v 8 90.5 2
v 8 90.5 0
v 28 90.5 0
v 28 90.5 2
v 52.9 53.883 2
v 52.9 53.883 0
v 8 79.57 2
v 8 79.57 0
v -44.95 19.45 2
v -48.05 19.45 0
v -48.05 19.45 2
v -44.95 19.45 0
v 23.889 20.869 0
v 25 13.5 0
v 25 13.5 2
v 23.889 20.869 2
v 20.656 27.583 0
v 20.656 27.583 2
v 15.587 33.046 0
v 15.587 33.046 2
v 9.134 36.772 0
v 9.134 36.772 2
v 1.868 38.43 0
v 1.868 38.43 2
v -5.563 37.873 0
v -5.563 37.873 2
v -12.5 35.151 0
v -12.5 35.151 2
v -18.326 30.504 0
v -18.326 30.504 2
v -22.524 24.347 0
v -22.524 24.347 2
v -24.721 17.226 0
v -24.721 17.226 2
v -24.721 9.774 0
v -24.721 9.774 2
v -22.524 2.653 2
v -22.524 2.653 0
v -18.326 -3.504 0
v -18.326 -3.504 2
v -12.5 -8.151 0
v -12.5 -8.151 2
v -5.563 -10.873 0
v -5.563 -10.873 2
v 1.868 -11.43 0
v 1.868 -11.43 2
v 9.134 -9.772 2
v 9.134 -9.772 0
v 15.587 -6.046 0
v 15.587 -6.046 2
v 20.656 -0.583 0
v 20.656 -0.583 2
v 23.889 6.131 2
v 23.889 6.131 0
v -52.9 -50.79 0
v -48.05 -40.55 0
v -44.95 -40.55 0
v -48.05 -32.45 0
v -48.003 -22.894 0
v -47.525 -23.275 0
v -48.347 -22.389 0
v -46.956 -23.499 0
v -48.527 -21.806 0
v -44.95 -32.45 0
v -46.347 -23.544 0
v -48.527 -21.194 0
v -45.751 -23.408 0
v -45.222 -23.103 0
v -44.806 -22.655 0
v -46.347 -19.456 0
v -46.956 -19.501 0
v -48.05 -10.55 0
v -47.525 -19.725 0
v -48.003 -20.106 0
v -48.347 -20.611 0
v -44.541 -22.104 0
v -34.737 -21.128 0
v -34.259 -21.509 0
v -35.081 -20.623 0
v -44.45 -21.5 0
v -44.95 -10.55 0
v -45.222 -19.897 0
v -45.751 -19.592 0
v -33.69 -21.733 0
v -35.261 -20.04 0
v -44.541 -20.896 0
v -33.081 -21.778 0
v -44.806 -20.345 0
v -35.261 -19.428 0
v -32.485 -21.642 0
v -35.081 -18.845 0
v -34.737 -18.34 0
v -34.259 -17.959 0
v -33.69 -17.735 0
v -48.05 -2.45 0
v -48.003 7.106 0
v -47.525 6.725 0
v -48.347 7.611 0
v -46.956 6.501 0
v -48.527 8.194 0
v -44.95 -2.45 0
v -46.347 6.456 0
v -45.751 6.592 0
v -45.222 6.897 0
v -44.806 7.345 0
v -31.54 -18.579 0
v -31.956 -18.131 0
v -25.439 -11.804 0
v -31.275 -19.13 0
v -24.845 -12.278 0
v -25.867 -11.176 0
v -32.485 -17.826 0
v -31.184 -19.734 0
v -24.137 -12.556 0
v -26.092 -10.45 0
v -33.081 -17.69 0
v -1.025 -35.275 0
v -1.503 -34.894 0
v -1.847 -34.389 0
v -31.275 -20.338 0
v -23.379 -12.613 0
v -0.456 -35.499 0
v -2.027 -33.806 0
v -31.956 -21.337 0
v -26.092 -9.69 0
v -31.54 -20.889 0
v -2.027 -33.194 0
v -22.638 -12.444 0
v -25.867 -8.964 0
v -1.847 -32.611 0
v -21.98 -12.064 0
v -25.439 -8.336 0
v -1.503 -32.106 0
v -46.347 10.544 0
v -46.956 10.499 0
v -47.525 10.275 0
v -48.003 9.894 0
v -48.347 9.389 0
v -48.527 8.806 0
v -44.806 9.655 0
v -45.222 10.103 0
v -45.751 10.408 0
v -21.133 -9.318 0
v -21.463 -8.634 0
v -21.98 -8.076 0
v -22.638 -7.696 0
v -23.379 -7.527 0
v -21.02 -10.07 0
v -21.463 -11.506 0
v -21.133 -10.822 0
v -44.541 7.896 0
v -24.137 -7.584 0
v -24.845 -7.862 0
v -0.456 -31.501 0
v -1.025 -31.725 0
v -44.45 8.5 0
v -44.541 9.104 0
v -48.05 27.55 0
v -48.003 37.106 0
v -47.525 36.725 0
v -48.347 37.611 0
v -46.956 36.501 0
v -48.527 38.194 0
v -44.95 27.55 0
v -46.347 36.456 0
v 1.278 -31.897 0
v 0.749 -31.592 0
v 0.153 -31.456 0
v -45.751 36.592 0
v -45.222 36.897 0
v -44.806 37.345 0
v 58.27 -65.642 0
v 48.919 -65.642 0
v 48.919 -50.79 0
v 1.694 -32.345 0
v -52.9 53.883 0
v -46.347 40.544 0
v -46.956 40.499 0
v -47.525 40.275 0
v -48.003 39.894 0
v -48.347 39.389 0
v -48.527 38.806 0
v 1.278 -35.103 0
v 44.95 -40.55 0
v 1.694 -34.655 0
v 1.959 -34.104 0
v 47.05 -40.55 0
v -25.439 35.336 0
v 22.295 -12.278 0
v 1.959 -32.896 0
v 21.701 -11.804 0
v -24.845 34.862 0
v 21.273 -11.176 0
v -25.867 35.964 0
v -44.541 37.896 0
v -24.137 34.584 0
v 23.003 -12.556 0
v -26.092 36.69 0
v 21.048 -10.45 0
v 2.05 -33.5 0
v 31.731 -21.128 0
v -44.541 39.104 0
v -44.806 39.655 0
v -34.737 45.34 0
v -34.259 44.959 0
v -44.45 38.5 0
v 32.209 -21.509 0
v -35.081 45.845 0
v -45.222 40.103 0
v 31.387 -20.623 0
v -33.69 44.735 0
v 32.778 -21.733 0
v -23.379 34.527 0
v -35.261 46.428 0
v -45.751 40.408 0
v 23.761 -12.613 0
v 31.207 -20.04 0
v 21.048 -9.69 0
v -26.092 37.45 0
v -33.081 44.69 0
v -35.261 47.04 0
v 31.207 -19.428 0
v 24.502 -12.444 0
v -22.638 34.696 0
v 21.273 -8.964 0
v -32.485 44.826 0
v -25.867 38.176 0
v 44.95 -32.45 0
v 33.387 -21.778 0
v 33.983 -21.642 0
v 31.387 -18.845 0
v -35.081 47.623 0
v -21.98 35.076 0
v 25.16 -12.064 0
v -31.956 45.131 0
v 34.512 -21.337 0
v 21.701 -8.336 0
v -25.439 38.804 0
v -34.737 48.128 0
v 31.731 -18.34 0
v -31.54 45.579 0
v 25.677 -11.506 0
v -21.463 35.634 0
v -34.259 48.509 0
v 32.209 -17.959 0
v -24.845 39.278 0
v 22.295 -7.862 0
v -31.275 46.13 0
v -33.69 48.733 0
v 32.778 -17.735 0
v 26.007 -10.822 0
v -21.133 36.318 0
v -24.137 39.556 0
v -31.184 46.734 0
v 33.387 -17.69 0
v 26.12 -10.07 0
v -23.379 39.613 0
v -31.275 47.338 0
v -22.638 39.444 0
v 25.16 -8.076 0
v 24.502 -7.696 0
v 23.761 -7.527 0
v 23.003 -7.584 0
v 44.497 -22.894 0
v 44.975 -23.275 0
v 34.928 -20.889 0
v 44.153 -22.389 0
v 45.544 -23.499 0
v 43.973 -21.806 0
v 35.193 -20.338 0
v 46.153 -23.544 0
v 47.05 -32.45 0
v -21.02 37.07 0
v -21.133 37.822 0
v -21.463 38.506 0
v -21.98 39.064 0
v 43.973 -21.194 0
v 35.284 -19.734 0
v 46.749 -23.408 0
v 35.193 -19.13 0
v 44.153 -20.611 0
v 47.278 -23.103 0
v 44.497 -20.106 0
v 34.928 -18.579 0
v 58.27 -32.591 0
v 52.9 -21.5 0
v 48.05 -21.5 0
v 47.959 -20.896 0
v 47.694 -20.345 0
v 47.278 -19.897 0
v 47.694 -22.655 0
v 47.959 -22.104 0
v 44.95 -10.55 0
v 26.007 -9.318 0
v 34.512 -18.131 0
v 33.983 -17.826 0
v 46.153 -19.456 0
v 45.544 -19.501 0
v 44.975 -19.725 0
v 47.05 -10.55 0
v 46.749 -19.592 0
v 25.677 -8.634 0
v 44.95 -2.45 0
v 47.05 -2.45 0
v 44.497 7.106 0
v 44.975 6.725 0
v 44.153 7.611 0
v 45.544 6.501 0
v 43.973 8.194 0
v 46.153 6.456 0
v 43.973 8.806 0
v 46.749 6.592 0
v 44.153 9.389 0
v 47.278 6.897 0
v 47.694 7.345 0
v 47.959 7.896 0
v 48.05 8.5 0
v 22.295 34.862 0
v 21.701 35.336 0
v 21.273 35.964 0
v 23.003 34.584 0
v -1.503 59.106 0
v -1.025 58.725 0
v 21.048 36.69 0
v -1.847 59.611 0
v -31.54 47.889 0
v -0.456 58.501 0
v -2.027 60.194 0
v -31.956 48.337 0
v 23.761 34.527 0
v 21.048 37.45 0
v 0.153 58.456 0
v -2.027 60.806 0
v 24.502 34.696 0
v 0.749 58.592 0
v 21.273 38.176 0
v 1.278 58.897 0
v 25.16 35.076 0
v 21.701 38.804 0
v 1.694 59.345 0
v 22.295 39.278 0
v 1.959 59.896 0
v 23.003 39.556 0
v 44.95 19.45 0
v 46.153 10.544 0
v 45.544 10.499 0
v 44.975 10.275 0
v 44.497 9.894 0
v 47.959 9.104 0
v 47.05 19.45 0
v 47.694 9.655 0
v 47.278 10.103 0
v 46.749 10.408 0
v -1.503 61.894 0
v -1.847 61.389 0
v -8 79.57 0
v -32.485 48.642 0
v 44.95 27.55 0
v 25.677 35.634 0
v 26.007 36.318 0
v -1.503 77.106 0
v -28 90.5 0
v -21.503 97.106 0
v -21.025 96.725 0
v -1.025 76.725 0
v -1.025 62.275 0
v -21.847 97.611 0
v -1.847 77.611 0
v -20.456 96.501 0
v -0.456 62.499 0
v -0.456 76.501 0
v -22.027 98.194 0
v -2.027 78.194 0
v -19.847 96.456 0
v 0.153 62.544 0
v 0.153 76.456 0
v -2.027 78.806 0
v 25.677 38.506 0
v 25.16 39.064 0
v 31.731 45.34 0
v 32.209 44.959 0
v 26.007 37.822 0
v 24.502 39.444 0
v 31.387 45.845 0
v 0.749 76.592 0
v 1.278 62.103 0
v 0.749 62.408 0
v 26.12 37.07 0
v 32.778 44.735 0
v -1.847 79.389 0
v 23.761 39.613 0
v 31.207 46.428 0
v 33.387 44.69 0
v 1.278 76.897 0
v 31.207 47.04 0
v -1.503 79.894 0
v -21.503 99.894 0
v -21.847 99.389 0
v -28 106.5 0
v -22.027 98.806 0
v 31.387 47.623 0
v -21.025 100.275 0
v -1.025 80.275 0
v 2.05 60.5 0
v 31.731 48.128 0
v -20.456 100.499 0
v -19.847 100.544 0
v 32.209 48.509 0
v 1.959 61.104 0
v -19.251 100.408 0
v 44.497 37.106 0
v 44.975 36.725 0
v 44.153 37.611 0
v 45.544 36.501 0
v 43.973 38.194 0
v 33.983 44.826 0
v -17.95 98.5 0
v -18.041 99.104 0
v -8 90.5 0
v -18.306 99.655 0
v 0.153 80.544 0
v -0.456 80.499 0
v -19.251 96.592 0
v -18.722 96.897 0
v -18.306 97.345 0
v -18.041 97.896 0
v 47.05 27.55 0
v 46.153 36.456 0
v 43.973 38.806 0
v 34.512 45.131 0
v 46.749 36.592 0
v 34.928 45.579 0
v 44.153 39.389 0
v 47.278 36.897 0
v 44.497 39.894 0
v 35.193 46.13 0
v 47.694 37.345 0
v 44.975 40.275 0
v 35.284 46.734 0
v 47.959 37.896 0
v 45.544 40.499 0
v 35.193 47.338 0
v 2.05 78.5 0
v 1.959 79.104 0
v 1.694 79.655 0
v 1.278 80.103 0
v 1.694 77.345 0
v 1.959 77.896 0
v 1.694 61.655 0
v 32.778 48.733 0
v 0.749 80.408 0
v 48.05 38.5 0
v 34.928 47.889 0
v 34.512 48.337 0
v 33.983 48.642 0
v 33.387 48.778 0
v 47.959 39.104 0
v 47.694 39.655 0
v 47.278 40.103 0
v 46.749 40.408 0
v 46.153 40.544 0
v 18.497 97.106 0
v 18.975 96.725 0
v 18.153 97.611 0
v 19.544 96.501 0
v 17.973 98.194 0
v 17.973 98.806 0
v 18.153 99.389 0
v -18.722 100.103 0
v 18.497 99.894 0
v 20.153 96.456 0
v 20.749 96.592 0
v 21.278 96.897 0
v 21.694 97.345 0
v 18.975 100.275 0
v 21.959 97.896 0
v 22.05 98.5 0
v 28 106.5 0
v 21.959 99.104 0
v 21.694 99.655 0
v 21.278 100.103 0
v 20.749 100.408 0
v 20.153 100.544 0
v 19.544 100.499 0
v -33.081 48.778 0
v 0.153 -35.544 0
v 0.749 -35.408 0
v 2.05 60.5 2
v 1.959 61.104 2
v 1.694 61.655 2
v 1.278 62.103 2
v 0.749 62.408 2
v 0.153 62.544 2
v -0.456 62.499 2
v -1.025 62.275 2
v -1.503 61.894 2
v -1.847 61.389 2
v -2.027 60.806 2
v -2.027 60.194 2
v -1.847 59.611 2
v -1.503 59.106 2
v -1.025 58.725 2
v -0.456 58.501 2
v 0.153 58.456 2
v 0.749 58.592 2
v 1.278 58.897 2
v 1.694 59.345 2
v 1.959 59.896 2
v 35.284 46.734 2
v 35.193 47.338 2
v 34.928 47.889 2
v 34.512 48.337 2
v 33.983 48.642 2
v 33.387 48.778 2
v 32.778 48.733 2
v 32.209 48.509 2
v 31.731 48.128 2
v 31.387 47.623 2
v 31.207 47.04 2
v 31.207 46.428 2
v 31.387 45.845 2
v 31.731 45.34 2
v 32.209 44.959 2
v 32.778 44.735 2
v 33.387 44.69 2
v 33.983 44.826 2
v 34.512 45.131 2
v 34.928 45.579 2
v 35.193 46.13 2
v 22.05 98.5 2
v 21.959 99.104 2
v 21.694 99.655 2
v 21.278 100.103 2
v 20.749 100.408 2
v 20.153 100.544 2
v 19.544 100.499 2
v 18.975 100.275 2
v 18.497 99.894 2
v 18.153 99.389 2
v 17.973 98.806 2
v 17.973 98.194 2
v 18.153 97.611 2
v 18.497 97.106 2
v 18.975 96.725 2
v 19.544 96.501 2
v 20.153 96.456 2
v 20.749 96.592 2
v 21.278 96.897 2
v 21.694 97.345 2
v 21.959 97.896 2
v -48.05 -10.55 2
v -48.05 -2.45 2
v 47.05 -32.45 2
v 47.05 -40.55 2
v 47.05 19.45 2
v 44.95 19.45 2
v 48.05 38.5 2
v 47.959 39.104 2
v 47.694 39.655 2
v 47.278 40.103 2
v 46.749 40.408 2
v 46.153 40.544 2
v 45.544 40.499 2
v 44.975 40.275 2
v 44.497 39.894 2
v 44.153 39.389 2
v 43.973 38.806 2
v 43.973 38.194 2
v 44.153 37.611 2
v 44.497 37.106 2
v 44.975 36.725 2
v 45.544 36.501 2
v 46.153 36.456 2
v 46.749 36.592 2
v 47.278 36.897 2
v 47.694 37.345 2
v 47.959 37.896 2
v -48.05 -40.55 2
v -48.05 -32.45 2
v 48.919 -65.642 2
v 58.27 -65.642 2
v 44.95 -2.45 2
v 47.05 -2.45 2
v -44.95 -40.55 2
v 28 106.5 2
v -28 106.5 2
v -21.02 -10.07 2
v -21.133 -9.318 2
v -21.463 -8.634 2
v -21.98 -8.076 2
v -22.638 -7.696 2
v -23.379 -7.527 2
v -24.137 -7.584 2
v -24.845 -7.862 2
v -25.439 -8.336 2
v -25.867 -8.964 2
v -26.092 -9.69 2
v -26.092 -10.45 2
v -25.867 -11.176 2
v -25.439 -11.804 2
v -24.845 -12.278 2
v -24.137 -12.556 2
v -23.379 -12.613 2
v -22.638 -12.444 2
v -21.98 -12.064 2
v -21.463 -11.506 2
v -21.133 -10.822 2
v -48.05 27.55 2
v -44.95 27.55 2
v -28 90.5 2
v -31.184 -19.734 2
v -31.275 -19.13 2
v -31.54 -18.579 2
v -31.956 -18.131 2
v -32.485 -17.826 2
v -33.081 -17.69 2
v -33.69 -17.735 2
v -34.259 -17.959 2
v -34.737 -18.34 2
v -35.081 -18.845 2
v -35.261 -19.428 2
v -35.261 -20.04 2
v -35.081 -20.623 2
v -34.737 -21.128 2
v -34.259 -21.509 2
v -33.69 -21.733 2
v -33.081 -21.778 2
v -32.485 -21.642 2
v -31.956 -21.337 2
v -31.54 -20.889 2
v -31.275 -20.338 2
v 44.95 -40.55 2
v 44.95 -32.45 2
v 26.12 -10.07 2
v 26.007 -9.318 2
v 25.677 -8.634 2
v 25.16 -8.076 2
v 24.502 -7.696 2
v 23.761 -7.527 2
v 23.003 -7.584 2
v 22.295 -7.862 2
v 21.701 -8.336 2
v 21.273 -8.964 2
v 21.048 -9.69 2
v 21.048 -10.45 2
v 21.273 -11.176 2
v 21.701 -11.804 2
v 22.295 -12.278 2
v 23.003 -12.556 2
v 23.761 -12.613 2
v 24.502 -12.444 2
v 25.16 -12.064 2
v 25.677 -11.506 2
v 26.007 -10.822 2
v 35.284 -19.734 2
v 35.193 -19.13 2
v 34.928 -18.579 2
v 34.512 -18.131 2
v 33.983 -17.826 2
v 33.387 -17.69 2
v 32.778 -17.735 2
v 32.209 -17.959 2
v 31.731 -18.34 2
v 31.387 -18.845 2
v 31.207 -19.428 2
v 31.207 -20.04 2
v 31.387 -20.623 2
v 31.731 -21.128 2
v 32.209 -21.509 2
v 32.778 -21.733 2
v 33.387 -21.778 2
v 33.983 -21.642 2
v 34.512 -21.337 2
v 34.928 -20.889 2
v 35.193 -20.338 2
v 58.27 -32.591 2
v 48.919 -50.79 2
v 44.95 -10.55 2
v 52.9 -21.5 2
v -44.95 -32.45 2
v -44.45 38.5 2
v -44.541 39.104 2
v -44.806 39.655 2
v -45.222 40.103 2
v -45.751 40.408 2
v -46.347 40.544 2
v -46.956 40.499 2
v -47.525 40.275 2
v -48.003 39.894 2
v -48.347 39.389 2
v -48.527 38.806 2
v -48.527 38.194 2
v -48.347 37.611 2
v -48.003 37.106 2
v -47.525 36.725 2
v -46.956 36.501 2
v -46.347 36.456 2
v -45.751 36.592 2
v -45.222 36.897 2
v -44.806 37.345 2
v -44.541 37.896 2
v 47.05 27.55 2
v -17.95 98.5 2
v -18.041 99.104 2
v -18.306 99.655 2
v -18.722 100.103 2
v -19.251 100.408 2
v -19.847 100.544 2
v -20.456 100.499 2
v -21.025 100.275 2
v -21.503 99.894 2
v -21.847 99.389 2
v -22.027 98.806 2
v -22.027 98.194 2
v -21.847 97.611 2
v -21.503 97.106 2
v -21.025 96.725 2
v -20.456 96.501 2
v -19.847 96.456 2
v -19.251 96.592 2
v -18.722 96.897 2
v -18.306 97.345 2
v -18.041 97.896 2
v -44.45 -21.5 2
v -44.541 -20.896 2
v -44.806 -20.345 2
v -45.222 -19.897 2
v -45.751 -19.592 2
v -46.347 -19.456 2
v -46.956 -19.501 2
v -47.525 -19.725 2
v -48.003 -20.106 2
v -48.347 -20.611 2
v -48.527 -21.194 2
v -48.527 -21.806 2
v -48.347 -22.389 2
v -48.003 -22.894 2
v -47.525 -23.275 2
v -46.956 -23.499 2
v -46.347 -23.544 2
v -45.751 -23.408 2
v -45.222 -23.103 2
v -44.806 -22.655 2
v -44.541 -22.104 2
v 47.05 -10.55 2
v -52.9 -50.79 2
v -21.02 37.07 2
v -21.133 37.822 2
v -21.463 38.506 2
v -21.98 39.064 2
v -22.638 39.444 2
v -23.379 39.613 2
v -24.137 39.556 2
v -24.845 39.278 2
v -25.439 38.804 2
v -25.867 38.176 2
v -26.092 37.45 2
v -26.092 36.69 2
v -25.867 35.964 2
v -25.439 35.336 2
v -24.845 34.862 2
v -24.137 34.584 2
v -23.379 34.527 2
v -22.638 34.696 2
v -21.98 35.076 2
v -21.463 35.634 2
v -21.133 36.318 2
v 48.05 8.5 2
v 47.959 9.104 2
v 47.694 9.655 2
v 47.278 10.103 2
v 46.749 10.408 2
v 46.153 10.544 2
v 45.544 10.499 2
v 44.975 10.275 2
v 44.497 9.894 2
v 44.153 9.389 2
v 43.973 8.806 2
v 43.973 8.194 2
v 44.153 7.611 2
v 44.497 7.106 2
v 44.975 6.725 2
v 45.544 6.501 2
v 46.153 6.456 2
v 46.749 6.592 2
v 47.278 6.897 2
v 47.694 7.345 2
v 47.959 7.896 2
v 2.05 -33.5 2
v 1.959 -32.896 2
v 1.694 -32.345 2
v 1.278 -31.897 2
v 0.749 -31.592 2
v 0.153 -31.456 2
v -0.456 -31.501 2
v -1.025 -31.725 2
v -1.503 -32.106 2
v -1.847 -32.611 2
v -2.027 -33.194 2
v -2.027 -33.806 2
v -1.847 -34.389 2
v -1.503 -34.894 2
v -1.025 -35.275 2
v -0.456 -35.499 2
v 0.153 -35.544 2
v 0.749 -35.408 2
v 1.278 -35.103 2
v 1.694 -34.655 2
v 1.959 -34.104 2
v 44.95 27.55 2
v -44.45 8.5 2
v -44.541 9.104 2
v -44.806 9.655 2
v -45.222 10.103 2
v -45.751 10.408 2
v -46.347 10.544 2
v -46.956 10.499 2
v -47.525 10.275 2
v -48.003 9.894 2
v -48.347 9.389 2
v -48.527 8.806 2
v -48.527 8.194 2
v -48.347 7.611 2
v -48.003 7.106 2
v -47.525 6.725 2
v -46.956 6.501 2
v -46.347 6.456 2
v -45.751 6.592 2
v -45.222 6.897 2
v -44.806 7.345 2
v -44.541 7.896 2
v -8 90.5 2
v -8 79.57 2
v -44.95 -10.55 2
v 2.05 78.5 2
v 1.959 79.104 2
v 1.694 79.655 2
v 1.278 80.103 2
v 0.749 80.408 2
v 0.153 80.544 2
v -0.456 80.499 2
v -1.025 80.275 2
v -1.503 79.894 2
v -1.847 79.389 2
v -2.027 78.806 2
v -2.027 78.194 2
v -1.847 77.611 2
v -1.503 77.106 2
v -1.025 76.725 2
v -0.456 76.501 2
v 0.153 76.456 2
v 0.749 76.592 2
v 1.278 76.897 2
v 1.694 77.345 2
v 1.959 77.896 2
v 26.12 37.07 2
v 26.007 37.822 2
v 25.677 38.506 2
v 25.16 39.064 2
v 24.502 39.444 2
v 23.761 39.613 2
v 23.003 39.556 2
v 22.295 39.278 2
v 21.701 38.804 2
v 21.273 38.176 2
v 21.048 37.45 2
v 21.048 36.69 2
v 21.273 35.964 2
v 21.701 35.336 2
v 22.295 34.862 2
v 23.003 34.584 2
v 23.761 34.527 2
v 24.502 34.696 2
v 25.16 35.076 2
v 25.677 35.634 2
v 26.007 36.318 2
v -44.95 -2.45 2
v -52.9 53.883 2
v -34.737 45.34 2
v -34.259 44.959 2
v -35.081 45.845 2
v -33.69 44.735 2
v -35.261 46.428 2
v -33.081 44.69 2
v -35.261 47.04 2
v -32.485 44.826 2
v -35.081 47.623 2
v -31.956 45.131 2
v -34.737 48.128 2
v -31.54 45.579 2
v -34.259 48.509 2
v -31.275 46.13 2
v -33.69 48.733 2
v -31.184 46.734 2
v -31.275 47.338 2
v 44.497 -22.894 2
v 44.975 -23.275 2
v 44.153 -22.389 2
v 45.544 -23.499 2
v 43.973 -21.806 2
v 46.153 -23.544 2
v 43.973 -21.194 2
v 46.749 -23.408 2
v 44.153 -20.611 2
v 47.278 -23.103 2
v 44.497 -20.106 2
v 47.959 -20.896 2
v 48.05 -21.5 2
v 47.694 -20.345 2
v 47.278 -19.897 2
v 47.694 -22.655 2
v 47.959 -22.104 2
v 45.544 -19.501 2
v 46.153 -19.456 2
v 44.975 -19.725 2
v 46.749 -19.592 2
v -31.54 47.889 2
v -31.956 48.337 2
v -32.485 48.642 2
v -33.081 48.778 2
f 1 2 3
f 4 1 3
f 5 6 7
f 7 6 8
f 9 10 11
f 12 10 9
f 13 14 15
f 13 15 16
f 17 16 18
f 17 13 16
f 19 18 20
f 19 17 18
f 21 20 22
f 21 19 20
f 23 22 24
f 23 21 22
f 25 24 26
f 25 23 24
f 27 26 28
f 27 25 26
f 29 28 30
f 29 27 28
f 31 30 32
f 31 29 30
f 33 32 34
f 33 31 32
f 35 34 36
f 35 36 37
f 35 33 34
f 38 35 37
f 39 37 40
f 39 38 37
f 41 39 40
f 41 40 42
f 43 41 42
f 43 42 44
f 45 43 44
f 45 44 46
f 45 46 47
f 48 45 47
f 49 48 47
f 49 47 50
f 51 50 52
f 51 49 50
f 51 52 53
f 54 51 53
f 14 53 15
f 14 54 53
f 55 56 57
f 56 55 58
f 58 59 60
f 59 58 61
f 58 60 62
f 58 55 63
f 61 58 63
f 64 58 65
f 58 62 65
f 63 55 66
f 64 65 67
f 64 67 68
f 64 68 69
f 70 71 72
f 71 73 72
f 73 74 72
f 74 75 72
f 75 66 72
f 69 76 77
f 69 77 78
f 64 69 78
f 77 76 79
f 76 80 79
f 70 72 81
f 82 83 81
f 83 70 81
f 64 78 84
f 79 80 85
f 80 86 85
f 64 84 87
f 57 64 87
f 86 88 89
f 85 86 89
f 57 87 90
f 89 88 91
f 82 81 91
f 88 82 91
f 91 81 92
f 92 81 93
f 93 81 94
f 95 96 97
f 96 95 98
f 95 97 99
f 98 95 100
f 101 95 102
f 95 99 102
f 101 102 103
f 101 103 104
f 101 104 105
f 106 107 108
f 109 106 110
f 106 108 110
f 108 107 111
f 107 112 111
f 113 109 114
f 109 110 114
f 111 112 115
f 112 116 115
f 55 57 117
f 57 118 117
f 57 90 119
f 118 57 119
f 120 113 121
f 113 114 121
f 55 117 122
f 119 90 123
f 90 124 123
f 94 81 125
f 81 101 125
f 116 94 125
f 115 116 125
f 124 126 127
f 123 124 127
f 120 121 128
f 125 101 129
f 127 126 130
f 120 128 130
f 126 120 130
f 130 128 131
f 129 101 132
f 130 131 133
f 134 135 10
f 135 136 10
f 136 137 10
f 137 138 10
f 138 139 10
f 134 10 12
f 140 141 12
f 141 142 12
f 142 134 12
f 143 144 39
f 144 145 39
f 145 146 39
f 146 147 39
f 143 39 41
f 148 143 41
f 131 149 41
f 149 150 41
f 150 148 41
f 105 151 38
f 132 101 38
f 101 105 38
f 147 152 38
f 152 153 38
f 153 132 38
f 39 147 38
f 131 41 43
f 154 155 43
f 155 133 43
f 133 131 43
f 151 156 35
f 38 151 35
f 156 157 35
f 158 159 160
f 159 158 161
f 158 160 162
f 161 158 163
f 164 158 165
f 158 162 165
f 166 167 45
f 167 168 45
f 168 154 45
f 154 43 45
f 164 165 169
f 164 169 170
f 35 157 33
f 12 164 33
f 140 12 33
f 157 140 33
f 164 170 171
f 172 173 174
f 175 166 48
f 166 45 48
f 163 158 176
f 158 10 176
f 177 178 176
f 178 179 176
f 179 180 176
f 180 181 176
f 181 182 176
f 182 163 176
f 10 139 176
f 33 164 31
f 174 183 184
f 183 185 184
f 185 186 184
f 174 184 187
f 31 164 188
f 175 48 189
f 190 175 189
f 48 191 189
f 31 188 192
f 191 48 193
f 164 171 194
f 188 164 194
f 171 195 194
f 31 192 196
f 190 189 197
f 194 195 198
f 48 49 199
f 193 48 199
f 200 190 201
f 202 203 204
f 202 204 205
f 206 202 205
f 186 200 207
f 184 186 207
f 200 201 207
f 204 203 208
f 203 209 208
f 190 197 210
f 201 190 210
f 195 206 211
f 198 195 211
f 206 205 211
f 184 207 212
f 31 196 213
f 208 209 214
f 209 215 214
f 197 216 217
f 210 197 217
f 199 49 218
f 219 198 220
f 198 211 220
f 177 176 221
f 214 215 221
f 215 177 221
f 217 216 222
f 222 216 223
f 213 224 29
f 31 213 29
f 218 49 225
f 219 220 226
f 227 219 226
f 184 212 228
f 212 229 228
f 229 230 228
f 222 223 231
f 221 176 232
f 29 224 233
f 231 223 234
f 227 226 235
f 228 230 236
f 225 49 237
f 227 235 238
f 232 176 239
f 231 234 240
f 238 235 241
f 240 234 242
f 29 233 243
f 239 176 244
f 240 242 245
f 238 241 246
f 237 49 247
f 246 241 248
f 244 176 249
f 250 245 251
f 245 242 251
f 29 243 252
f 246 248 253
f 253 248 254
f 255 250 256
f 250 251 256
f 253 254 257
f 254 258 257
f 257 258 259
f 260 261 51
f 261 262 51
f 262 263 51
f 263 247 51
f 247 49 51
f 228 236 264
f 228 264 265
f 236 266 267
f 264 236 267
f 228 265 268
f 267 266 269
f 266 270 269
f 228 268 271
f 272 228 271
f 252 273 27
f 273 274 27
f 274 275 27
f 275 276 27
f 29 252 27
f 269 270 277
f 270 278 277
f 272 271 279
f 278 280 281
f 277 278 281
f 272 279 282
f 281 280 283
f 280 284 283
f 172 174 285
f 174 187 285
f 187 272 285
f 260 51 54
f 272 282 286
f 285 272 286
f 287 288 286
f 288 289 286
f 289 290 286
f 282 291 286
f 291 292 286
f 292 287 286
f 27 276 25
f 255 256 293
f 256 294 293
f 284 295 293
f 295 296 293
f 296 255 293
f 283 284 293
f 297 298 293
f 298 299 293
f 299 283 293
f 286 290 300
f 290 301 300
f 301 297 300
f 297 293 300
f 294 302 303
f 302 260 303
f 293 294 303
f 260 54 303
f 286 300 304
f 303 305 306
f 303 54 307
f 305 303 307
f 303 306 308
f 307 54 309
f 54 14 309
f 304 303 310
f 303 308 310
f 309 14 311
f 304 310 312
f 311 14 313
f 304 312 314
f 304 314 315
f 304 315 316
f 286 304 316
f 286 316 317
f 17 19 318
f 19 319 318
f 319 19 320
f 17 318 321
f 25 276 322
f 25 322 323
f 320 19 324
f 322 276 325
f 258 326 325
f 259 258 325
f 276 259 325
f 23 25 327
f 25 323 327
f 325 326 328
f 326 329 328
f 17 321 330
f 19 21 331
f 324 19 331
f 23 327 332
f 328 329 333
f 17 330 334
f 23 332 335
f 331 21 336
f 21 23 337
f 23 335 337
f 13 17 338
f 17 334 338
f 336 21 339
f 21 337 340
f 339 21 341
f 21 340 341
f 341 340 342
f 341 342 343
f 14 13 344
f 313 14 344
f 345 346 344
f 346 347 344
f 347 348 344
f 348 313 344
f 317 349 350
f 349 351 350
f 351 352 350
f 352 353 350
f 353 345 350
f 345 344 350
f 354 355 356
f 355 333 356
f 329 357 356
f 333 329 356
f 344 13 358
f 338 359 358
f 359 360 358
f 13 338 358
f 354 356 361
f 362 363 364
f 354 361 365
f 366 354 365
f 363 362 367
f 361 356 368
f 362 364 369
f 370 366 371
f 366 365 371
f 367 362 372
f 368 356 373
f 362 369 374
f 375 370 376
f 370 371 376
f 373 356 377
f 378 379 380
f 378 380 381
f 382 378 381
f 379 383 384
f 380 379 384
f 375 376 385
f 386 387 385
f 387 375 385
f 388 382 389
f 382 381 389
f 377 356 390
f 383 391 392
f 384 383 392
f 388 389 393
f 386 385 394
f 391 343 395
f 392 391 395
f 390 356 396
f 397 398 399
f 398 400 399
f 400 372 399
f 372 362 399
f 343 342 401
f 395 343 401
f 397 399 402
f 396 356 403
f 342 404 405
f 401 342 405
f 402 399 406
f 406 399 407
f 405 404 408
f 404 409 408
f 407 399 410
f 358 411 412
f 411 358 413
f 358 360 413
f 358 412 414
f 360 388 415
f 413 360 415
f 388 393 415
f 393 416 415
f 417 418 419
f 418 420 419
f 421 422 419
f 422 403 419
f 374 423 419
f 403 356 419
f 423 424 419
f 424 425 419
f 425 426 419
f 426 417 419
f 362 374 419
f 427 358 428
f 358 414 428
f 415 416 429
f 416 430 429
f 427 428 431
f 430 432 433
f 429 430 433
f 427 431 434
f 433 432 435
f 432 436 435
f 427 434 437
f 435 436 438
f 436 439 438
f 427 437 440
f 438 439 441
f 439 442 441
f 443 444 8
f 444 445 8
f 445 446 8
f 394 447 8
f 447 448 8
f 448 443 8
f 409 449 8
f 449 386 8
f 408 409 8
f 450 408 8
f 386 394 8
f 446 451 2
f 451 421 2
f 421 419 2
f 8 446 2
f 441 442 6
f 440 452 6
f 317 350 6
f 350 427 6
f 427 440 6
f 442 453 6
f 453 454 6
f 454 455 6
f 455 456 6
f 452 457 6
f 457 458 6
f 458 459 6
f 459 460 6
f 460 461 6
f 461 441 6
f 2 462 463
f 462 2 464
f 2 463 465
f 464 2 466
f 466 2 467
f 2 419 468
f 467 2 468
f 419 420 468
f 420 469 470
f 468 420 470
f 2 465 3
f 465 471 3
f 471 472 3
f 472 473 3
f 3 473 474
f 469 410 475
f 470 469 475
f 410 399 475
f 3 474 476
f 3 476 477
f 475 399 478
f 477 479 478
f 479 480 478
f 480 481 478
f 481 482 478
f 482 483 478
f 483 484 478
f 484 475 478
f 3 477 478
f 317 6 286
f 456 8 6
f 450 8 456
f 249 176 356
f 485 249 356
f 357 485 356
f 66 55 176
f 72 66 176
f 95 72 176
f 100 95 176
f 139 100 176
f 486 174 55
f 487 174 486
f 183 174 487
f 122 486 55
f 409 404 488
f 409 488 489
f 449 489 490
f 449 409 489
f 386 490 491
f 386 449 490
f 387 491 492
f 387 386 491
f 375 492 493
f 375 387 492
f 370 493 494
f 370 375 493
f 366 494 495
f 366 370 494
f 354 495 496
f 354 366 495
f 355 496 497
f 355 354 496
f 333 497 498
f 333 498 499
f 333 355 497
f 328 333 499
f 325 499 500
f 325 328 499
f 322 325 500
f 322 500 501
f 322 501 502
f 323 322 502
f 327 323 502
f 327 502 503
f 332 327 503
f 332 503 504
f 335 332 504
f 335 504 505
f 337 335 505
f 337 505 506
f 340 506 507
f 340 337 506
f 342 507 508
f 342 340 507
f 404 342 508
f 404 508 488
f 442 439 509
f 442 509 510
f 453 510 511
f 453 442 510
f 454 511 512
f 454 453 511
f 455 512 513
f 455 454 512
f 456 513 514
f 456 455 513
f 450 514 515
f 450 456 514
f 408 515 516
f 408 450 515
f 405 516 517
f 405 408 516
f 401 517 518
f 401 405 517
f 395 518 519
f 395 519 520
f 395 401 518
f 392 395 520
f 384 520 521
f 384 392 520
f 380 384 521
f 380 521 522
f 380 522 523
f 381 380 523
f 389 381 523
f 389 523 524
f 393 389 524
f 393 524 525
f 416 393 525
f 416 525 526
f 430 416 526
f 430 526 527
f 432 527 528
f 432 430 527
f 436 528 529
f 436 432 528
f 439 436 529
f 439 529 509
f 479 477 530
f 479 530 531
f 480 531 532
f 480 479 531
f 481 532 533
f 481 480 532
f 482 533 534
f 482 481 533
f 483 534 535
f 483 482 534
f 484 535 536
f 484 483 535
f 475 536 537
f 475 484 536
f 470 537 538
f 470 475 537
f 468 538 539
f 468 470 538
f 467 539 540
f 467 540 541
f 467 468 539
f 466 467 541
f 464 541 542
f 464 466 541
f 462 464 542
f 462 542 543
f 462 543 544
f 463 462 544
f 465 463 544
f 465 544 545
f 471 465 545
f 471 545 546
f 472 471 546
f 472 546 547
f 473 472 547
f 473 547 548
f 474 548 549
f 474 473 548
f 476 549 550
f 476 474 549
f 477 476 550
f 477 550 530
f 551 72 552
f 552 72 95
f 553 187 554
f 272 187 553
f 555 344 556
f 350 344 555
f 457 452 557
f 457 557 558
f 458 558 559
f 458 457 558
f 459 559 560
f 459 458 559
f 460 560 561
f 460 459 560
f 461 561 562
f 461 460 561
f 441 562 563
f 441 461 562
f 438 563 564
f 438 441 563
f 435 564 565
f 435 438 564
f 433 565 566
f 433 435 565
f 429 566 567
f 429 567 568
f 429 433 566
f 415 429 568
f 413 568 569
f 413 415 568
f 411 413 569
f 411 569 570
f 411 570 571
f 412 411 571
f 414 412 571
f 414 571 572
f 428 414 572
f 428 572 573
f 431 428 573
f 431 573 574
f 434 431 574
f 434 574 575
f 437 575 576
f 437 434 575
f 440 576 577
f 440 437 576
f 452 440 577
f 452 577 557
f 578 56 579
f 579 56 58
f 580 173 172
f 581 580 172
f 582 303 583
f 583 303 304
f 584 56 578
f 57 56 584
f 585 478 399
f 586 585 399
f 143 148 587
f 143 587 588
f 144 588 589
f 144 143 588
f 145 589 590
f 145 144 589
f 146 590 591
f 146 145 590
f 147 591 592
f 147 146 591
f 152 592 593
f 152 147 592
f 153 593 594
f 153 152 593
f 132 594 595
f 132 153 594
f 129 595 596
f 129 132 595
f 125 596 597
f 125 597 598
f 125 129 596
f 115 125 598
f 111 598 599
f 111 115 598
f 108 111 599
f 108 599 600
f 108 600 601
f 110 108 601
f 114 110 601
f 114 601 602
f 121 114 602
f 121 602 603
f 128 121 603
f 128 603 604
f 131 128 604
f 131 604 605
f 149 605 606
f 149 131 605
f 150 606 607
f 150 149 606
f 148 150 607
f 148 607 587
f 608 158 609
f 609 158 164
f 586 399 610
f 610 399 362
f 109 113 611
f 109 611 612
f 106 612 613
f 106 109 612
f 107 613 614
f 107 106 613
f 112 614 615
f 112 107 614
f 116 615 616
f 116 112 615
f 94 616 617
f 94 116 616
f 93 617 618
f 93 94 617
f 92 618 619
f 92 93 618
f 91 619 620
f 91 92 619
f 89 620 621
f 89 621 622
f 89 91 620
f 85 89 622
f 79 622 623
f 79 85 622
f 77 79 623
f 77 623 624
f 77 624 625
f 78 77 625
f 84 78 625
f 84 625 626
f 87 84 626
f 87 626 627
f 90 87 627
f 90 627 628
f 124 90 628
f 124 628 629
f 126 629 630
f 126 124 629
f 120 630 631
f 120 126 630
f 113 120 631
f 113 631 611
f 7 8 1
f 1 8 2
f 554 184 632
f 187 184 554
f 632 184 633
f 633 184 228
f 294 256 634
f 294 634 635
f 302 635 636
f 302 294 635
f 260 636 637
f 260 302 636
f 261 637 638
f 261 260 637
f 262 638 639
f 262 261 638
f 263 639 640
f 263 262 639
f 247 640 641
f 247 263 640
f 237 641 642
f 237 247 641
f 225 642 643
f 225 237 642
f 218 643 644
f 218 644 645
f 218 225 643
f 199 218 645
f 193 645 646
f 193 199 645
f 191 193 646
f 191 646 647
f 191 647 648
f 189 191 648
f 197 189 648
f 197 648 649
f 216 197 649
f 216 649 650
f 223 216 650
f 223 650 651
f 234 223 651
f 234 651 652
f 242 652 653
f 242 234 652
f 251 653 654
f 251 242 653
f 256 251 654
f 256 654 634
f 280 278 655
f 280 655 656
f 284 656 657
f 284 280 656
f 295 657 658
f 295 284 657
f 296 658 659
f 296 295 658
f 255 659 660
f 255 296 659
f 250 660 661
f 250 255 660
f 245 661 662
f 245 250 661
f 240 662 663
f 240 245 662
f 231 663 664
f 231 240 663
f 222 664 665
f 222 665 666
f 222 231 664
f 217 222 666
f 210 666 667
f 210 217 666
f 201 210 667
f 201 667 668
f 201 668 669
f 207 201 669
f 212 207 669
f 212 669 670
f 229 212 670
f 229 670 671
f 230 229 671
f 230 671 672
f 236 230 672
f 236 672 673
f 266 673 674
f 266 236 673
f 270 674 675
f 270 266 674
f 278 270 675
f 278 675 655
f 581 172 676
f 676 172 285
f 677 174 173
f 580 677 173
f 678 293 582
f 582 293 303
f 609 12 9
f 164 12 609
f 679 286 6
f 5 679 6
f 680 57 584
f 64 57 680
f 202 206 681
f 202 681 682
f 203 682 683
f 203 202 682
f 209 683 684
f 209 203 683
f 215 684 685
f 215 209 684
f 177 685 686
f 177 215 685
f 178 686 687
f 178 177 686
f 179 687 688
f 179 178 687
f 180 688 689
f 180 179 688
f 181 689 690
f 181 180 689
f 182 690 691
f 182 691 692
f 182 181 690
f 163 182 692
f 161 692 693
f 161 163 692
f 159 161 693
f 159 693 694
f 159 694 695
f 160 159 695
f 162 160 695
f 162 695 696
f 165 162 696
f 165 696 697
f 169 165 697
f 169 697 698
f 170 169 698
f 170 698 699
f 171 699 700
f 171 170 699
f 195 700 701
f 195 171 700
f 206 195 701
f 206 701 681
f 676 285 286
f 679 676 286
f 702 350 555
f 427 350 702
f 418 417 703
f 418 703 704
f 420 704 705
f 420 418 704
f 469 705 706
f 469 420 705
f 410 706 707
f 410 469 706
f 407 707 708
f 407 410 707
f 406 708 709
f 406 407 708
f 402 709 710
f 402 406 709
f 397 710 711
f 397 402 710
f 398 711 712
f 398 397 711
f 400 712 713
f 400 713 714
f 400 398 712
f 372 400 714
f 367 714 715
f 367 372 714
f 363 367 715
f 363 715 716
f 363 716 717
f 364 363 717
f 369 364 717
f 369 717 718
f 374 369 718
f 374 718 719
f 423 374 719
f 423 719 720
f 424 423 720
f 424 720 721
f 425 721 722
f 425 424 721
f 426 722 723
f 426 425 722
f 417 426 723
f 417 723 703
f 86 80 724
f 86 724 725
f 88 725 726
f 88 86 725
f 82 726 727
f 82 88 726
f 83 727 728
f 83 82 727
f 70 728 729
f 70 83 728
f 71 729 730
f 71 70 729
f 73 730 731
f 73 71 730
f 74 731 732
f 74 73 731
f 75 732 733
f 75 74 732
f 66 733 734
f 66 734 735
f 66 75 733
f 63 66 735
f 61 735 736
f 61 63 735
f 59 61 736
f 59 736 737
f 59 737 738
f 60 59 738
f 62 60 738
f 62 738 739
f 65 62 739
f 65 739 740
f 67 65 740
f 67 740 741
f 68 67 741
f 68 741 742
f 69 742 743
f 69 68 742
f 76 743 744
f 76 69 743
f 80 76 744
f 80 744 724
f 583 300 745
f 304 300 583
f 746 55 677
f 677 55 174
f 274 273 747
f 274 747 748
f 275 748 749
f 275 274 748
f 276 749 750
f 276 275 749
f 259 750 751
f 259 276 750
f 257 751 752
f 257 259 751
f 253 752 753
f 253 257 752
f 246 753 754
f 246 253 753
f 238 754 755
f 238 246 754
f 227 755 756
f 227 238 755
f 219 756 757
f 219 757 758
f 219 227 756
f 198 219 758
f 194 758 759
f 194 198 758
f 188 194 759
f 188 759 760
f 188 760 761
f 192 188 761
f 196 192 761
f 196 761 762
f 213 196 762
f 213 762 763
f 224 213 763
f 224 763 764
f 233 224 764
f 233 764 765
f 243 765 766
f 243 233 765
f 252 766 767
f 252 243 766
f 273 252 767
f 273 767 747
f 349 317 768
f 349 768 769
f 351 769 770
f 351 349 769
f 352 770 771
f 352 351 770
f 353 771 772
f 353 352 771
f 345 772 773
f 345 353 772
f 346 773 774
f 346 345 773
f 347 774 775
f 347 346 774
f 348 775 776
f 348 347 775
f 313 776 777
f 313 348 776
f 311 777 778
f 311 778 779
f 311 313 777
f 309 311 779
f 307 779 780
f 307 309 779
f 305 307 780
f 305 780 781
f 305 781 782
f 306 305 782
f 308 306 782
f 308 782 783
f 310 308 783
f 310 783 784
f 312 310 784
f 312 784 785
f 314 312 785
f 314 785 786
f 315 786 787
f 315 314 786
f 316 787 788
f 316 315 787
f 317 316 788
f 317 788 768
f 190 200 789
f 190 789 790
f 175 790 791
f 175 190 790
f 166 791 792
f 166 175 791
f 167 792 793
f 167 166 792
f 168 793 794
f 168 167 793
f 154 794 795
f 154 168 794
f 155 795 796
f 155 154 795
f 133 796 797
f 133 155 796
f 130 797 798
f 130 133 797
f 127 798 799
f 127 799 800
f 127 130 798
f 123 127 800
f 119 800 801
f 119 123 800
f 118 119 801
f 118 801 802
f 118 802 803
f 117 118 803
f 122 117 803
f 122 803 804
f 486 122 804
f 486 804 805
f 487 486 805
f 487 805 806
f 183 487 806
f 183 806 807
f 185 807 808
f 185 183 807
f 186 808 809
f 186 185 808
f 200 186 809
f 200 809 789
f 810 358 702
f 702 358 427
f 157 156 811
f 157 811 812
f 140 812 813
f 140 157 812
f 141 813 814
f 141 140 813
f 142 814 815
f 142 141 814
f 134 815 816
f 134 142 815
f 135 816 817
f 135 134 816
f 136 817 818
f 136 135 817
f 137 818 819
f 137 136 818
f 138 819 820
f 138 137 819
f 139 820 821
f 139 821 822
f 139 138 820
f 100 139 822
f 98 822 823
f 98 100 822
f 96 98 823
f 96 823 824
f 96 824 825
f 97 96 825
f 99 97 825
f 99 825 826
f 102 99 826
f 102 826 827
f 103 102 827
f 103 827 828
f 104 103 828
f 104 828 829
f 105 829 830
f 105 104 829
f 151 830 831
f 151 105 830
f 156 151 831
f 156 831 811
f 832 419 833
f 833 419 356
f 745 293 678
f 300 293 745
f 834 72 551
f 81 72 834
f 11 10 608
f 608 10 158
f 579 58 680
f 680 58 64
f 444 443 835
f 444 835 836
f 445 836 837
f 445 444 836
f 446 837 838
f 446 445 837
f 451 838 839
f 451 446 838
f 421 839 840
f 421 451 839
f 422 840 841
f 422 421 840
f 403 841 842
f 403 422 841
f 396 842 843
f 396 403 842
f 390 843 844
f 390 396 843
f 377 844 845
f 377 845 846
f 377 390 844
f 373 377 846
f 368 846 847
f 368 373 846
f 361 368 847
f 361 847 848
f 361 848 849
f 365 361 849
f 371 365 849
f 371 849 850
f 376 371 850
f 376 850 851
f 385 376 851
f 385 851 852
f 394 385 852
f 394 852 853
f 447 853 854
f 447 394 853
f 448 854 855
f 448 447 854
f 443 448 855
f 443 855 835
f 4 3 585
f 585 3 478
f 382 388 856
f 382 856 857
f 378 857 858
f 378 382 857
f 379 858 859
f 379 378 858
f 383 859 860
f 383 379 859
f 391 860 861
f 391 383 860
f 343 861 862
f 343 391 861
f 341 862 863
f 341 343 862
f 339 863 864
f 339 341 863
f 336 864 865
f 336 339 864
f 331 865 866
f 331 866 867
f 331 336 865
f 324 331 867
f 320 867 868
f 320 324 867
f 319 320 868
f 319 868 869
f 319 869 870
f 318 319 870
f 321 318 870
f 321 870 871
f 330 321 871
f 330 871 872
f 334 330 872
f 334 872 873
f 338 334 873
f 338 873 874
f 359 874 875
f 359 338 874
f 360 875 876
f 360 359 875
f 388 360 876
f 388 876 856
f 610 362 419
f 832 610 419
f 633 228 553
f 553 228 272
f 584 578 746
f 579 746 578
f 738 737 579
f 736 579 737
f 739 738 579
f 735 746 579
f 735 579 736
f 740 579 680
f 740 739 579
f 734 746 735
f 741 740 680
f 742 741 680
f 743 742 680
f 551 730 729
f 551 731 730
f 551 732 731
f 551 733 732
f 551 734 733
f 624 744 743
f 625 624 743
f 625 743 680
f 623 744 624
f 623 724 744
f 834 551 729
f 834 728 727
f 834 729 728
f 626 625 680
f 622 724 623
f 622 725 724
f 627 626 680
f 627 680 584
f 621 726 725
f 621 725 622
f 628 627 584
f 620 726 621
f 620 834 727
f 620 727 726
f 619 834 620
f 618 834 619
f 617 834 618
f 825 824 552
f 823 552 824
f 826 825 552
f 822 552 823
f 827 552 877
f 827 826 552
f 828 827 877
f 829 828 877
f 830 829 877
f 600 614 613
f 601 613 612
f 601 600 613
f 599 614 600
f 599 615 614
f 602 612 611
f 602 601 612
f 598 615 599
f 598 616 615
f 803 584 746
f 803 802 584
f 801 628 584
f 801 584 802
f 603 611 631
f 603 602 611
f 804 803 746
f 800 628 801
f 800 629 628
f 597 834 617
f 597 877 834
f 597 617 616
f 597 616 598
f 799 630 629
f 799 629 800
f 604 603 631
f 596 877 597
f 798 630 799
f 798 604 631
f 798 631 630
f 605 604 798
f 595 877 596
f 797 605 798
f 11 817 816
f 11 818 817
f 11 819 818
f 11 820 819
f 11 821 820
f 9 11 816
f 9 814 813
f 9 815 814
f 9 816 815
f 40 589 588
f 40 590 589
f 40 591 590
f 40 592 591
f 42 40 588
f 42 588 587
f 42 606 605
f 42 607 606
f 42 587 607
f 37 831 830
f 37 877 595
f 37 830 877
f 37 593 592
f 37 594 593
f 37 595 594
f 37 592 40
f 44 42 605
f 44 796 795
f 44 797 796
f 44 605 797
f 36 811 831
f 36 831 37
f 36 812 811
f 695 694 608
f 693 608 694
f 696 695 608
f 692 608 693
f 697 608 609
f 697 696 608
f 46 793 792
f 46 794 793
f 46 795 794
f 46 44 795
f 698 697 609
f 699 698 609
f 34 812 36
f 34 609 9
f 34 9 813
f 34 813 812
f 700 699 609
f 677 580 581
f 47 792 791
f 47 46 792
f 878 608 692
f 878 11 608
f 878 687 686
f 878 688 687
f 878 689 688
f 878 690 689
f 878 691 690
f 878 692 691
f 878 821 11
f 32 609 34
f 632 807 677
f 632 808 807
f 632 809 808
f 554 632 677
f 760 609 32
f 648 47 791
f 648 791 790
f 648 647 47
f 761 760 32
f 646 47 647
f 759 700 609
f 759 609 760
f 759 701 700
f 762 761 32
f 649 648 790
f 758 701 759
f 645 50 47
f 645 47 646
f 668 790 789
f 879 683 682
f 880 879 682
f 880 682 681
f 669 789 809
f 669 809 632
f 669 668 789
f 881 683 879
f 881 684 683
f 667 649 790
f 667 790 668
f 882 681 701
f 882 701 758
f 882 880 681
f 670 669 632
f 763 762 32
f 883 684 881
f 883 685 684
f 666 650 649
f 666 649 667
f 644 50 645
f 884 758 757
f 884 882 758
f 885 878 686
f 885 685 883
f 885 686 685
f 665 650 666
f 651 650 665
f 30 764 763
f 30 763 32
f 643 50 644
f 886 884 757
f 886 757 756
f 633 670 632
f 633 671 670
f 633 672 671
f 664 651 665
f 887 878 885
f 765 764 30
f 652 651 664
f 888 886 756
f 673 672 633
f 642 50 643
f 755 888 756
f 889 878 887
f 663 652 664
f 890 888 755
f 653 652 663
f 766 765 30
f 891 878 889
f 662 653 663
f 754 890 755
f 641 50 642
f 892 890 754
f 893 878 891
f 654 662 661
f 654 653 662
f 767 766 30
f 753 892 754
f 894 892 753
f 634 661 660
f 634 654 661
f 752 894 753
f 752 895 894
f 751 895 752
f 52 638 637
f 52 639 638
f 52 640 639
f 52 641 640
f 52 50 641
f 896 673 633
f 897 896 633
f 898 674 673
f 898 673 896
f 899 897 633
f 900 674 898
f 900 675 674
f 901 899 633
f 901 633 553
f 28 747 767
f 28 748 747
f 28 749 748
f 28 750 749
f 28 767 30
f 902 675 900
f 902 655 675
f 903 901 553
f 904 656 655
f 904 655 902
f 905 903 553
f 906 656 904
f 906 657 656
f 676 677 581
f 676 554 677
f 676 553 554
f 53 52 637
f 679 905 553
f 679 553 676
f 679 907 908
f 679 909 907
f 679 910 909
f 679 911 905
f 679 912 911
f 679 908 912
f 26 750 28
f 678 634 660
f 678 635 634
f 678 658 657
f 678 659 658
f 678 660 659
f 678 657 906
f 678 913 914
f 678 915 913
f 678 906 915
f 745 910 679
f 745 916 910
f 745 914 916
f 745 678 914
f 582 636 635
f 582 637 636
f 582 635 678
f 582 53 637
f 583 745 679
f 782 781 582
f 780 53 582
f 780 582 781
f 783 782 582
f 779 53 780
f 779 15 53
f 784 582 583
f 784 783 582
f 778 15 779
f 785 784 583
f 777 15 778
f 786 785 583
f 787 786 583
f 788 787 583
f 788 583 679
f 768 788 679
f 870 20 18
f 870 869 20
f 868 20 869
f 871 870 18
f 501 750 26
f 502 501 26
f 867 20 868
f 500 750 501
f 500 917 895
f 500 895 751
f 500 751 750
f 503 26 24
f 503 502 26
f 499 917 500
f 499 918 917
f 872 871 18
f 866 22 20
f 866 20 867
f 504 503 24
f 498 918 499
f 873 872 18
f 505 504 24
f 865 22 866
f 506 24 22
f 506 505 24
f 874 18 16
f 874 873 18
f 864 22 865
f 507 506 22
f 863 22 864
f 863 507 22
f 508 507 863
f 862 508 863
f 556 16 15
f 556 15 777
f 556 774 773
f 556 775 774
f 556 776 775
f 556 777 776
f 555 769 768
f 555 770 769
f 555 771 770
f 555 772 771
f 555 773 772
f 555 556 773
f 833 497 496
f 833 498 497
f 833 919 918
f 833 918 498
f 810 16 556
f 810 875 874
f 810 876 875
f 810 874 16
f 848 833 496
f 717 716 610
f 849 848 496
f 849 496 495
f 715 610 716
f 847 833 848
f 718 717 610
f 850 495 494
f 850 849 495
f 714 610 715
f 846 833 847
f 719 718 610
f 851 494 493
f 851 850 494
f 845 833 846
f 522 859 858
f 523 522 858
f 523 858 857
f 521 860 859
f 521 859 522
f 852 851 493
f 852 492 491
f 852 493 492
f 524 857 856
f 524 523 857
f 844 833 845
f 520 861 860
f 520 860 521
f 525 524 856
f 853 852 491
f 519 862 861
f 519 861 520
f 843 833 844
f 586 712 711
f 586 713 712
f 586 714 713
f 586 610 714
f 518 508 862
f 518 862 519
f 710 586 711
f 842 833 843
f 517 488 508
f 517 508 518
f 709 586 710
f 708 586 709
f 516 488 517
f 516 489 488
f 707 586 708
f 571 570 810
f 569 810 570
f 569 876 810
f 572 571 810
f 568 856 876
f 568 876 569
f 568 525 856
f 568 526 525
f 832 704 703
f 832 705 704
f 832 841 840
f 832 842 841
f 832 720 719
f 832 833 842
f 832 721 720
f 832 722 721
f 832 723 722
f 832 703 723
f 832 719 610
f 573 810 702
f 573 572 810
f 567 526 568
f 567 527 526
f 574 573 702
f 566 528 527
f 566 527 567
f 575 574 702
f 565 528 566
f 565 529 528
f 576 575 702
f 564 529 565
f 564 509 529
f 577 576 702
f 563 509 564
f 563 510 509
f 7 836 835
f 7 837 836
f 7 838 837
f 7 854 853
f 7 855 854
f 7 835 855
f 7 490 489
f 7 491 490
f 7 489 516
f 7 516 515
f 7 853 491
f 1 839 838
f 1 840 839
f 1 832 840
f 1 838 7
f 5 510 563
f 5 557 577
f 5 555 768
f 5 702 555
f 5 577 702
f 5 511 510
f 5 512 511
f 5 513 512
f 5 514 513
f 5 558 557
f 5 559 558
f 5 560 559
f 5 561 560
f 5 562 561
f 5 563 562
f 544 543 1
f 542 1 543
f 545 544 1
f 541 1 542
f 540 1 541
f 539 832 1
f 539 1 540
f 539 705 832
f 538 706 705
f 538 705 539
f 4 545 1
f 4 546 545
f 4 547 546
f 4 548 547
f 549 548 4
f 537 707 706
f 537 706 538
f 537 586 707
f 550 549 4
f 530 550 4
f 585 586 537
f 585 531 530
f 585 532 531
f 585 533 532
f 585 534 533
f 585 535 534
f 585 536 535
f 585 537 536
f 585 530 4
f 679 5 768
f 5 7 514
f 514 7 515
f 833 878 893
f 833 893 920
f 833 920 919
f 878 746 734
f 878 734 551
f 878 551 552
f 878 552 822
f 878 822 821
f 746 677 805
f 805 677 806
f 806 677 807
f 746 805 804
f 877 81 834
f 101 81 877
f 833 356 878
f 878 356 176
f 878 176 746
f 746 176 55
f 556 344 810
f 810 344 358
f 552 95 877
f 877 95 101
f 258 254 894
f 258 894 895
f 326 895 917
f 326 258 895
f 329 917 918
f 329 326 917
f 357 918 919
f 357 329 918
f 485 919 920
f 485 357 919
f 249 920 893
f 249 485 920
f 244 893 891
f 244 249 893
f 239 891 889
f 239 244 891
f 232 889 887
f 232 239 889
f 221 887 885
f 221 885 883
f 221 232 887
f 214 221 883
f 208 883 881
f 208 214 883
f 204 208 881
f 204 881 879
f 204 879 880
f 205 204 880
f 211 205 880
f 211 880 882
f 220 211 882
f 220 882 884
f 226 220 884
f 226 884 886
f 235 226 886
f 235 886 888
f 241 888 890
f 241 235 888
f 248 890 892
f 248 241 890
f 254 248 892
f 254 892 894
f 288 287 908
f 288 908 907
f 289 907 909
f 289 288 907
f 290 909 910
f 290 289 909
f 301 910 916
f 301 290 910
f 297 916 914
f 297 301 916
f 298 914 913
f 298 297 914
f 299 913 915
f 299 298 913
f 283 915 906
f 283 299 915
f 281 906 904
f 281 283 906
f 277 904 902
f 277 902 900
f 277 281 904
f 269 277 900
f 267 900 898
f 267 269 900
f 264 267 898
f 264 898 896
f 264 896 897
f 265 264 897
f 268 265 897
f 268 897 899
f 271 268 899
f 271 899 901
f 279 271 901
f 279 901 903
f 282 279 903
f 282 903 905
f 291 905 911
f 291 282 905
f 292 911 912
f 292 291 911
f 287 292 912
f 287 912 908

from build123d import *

# Parameters (mm, degrees)
SKETCH_1_W      = 3.1
SKETCH_1_H      = 8.1
SKETCH_1_R      = 2.05
SKETCH_1_R_2    = 2.55
SKETCH_1_R_3    = 25
SKETCH_1_W_2    = 2.1
EXTRUDE_1_DEPTH = 2


with BuildPart() as part:
    # 草图1 → 凸台-拉伸1 (new body)
    with BuildSketch(Plane.XY):
        Polygon((52.9, -21.5), (52.9, 53.883164809), (8, 79.569735886), (8, 90.5), (28, 90.5), (28, 106.5), (-28, 106.5), (-28, 90.5), (-8, 90.5), (-8, 79.569735886), (-52.9, 53.883164809), (-52.9, -50.79), (-43.709229173, -50.79), (-34.403358285, -50.79), (48.918692166, -50.79), (48.918692166, -65.64215863), (58.26995581, -65.64215863), (58.26995581, -32.590877477), align=None)
        with Locations((-46.5, -36.5)):
            Rectangle(SKETCH_1_W, SKETCH_1_H, mode=Mode.SUBTRACT)
        with Locations((0, -33.5)):
            Circle(SKETCH_1_R, mode=Mode.SUBTRACT)
        with Locations((-46.5, -21.5)):
            Circle(SKETCH_1_R, mode=Mode.SUBTRACT)
        with Locations((-46.5, -6.5)):
            Rectangle(SKETCH_1_W, SKETCH_1_H, mode=Mode.SUBTRACT)
        with Locations((-33.234018716, -19.734018716)):
            Circle(SKETCH_1_R, mode=Mode.SUBTRACT)
        with Locations((-46.5, 8.5)):
            Circle(SKETCH_1_R, mode=Mode.SUBTRACT)
        with Locations((-23.57, -10.07)):
            Circle(SKETCH_1_R_2, mode=Mode.SUBTRACT)
        with Locations((0, 13.5)):
            Circle(SKETCH_1_R_3, mode=Mode.SUBTRACT)
        with Locations((46, -36.5)):
            Rectangle(SKETCH_1_W_2, SKETCH_1_H, mode=Mode.SUBTRACT)
        with Locations((23.57, -10.07)):
            Circle(SKETCH_1_R_2, mode=Mode.SUBTRACT)
        with Locations((33.234018716, -19.734018716)):
            Circle(SKETCH_1_R, mode=Mode.SUBTRACT)
        with Locations((46, -21.5)):
            Circle(SKETCH_1_R, mode=Mode.SUBTRACT)
        with Locations((46, -6.5)):
            Rectangle(SKETCH_1_W_2, SKETCH_1_H, mode=Mode.SUBTRACT)
        with Locations((46, 8.5)):
            Circle(SKETCH_1_R, mode=Mode.SUBTRACT)
        with Locations((-46.5, 23.5)):
            Rectangle(SKETCH_1_W, SKETCH_1_H, mode=Mode.SUBTRACT)
        with Locations((-46.5, 38.5)):
            Circle(SKETCH_1_R, mode=Mode.SUBTRACT)
        with Locations((-33.234018716, 46.734018716)):
            Circle(SKETCH_1_R, mode=Mode.SUBTRACT)
        with Locations((-23.57, 37.07)):
            Circle(SKETCH_1_R_2, mode=Mode.SUBTRACT)
        with Locations((0, 60.5)):
            Circle(SKETCH_1_R, mode=Mode.SUBTRACT)
        with Locations((0, 78.5)):
            Circle(SKETCH_1_R, mode=Mode.SUBTRACT)
        with Locations((-20, 98.5)):
            Circle(SKETCH_1_R, mode=Mode.SUBTRACT)
        with Locations((23.57, 37.07)):
            Circle(SKETCH_1_R_2, mode=Mode.SUBTRACT)
        with Locations((46, 23.5)):
            Rectangle(SKETCH_1_W_2, SKETCH_1_H, mode=Mode.SUBTRACT)
        with Locations((46, 38.5)):
            Circle(SKETCH_1_R, mode=Mode.SUBTRACT)
        with Locations((33.234018716, 46.734018716)):
            Circle(SKETCH_1_R, mode=Mode.SUBTRACT)
        with Locations((20, 98.5)):
            Circle(SKETCH_1_R, mode=Mode.SUBTRACT)
    extrude(amount=EXTRUDE_1_DEPTH)


solid = part.part
